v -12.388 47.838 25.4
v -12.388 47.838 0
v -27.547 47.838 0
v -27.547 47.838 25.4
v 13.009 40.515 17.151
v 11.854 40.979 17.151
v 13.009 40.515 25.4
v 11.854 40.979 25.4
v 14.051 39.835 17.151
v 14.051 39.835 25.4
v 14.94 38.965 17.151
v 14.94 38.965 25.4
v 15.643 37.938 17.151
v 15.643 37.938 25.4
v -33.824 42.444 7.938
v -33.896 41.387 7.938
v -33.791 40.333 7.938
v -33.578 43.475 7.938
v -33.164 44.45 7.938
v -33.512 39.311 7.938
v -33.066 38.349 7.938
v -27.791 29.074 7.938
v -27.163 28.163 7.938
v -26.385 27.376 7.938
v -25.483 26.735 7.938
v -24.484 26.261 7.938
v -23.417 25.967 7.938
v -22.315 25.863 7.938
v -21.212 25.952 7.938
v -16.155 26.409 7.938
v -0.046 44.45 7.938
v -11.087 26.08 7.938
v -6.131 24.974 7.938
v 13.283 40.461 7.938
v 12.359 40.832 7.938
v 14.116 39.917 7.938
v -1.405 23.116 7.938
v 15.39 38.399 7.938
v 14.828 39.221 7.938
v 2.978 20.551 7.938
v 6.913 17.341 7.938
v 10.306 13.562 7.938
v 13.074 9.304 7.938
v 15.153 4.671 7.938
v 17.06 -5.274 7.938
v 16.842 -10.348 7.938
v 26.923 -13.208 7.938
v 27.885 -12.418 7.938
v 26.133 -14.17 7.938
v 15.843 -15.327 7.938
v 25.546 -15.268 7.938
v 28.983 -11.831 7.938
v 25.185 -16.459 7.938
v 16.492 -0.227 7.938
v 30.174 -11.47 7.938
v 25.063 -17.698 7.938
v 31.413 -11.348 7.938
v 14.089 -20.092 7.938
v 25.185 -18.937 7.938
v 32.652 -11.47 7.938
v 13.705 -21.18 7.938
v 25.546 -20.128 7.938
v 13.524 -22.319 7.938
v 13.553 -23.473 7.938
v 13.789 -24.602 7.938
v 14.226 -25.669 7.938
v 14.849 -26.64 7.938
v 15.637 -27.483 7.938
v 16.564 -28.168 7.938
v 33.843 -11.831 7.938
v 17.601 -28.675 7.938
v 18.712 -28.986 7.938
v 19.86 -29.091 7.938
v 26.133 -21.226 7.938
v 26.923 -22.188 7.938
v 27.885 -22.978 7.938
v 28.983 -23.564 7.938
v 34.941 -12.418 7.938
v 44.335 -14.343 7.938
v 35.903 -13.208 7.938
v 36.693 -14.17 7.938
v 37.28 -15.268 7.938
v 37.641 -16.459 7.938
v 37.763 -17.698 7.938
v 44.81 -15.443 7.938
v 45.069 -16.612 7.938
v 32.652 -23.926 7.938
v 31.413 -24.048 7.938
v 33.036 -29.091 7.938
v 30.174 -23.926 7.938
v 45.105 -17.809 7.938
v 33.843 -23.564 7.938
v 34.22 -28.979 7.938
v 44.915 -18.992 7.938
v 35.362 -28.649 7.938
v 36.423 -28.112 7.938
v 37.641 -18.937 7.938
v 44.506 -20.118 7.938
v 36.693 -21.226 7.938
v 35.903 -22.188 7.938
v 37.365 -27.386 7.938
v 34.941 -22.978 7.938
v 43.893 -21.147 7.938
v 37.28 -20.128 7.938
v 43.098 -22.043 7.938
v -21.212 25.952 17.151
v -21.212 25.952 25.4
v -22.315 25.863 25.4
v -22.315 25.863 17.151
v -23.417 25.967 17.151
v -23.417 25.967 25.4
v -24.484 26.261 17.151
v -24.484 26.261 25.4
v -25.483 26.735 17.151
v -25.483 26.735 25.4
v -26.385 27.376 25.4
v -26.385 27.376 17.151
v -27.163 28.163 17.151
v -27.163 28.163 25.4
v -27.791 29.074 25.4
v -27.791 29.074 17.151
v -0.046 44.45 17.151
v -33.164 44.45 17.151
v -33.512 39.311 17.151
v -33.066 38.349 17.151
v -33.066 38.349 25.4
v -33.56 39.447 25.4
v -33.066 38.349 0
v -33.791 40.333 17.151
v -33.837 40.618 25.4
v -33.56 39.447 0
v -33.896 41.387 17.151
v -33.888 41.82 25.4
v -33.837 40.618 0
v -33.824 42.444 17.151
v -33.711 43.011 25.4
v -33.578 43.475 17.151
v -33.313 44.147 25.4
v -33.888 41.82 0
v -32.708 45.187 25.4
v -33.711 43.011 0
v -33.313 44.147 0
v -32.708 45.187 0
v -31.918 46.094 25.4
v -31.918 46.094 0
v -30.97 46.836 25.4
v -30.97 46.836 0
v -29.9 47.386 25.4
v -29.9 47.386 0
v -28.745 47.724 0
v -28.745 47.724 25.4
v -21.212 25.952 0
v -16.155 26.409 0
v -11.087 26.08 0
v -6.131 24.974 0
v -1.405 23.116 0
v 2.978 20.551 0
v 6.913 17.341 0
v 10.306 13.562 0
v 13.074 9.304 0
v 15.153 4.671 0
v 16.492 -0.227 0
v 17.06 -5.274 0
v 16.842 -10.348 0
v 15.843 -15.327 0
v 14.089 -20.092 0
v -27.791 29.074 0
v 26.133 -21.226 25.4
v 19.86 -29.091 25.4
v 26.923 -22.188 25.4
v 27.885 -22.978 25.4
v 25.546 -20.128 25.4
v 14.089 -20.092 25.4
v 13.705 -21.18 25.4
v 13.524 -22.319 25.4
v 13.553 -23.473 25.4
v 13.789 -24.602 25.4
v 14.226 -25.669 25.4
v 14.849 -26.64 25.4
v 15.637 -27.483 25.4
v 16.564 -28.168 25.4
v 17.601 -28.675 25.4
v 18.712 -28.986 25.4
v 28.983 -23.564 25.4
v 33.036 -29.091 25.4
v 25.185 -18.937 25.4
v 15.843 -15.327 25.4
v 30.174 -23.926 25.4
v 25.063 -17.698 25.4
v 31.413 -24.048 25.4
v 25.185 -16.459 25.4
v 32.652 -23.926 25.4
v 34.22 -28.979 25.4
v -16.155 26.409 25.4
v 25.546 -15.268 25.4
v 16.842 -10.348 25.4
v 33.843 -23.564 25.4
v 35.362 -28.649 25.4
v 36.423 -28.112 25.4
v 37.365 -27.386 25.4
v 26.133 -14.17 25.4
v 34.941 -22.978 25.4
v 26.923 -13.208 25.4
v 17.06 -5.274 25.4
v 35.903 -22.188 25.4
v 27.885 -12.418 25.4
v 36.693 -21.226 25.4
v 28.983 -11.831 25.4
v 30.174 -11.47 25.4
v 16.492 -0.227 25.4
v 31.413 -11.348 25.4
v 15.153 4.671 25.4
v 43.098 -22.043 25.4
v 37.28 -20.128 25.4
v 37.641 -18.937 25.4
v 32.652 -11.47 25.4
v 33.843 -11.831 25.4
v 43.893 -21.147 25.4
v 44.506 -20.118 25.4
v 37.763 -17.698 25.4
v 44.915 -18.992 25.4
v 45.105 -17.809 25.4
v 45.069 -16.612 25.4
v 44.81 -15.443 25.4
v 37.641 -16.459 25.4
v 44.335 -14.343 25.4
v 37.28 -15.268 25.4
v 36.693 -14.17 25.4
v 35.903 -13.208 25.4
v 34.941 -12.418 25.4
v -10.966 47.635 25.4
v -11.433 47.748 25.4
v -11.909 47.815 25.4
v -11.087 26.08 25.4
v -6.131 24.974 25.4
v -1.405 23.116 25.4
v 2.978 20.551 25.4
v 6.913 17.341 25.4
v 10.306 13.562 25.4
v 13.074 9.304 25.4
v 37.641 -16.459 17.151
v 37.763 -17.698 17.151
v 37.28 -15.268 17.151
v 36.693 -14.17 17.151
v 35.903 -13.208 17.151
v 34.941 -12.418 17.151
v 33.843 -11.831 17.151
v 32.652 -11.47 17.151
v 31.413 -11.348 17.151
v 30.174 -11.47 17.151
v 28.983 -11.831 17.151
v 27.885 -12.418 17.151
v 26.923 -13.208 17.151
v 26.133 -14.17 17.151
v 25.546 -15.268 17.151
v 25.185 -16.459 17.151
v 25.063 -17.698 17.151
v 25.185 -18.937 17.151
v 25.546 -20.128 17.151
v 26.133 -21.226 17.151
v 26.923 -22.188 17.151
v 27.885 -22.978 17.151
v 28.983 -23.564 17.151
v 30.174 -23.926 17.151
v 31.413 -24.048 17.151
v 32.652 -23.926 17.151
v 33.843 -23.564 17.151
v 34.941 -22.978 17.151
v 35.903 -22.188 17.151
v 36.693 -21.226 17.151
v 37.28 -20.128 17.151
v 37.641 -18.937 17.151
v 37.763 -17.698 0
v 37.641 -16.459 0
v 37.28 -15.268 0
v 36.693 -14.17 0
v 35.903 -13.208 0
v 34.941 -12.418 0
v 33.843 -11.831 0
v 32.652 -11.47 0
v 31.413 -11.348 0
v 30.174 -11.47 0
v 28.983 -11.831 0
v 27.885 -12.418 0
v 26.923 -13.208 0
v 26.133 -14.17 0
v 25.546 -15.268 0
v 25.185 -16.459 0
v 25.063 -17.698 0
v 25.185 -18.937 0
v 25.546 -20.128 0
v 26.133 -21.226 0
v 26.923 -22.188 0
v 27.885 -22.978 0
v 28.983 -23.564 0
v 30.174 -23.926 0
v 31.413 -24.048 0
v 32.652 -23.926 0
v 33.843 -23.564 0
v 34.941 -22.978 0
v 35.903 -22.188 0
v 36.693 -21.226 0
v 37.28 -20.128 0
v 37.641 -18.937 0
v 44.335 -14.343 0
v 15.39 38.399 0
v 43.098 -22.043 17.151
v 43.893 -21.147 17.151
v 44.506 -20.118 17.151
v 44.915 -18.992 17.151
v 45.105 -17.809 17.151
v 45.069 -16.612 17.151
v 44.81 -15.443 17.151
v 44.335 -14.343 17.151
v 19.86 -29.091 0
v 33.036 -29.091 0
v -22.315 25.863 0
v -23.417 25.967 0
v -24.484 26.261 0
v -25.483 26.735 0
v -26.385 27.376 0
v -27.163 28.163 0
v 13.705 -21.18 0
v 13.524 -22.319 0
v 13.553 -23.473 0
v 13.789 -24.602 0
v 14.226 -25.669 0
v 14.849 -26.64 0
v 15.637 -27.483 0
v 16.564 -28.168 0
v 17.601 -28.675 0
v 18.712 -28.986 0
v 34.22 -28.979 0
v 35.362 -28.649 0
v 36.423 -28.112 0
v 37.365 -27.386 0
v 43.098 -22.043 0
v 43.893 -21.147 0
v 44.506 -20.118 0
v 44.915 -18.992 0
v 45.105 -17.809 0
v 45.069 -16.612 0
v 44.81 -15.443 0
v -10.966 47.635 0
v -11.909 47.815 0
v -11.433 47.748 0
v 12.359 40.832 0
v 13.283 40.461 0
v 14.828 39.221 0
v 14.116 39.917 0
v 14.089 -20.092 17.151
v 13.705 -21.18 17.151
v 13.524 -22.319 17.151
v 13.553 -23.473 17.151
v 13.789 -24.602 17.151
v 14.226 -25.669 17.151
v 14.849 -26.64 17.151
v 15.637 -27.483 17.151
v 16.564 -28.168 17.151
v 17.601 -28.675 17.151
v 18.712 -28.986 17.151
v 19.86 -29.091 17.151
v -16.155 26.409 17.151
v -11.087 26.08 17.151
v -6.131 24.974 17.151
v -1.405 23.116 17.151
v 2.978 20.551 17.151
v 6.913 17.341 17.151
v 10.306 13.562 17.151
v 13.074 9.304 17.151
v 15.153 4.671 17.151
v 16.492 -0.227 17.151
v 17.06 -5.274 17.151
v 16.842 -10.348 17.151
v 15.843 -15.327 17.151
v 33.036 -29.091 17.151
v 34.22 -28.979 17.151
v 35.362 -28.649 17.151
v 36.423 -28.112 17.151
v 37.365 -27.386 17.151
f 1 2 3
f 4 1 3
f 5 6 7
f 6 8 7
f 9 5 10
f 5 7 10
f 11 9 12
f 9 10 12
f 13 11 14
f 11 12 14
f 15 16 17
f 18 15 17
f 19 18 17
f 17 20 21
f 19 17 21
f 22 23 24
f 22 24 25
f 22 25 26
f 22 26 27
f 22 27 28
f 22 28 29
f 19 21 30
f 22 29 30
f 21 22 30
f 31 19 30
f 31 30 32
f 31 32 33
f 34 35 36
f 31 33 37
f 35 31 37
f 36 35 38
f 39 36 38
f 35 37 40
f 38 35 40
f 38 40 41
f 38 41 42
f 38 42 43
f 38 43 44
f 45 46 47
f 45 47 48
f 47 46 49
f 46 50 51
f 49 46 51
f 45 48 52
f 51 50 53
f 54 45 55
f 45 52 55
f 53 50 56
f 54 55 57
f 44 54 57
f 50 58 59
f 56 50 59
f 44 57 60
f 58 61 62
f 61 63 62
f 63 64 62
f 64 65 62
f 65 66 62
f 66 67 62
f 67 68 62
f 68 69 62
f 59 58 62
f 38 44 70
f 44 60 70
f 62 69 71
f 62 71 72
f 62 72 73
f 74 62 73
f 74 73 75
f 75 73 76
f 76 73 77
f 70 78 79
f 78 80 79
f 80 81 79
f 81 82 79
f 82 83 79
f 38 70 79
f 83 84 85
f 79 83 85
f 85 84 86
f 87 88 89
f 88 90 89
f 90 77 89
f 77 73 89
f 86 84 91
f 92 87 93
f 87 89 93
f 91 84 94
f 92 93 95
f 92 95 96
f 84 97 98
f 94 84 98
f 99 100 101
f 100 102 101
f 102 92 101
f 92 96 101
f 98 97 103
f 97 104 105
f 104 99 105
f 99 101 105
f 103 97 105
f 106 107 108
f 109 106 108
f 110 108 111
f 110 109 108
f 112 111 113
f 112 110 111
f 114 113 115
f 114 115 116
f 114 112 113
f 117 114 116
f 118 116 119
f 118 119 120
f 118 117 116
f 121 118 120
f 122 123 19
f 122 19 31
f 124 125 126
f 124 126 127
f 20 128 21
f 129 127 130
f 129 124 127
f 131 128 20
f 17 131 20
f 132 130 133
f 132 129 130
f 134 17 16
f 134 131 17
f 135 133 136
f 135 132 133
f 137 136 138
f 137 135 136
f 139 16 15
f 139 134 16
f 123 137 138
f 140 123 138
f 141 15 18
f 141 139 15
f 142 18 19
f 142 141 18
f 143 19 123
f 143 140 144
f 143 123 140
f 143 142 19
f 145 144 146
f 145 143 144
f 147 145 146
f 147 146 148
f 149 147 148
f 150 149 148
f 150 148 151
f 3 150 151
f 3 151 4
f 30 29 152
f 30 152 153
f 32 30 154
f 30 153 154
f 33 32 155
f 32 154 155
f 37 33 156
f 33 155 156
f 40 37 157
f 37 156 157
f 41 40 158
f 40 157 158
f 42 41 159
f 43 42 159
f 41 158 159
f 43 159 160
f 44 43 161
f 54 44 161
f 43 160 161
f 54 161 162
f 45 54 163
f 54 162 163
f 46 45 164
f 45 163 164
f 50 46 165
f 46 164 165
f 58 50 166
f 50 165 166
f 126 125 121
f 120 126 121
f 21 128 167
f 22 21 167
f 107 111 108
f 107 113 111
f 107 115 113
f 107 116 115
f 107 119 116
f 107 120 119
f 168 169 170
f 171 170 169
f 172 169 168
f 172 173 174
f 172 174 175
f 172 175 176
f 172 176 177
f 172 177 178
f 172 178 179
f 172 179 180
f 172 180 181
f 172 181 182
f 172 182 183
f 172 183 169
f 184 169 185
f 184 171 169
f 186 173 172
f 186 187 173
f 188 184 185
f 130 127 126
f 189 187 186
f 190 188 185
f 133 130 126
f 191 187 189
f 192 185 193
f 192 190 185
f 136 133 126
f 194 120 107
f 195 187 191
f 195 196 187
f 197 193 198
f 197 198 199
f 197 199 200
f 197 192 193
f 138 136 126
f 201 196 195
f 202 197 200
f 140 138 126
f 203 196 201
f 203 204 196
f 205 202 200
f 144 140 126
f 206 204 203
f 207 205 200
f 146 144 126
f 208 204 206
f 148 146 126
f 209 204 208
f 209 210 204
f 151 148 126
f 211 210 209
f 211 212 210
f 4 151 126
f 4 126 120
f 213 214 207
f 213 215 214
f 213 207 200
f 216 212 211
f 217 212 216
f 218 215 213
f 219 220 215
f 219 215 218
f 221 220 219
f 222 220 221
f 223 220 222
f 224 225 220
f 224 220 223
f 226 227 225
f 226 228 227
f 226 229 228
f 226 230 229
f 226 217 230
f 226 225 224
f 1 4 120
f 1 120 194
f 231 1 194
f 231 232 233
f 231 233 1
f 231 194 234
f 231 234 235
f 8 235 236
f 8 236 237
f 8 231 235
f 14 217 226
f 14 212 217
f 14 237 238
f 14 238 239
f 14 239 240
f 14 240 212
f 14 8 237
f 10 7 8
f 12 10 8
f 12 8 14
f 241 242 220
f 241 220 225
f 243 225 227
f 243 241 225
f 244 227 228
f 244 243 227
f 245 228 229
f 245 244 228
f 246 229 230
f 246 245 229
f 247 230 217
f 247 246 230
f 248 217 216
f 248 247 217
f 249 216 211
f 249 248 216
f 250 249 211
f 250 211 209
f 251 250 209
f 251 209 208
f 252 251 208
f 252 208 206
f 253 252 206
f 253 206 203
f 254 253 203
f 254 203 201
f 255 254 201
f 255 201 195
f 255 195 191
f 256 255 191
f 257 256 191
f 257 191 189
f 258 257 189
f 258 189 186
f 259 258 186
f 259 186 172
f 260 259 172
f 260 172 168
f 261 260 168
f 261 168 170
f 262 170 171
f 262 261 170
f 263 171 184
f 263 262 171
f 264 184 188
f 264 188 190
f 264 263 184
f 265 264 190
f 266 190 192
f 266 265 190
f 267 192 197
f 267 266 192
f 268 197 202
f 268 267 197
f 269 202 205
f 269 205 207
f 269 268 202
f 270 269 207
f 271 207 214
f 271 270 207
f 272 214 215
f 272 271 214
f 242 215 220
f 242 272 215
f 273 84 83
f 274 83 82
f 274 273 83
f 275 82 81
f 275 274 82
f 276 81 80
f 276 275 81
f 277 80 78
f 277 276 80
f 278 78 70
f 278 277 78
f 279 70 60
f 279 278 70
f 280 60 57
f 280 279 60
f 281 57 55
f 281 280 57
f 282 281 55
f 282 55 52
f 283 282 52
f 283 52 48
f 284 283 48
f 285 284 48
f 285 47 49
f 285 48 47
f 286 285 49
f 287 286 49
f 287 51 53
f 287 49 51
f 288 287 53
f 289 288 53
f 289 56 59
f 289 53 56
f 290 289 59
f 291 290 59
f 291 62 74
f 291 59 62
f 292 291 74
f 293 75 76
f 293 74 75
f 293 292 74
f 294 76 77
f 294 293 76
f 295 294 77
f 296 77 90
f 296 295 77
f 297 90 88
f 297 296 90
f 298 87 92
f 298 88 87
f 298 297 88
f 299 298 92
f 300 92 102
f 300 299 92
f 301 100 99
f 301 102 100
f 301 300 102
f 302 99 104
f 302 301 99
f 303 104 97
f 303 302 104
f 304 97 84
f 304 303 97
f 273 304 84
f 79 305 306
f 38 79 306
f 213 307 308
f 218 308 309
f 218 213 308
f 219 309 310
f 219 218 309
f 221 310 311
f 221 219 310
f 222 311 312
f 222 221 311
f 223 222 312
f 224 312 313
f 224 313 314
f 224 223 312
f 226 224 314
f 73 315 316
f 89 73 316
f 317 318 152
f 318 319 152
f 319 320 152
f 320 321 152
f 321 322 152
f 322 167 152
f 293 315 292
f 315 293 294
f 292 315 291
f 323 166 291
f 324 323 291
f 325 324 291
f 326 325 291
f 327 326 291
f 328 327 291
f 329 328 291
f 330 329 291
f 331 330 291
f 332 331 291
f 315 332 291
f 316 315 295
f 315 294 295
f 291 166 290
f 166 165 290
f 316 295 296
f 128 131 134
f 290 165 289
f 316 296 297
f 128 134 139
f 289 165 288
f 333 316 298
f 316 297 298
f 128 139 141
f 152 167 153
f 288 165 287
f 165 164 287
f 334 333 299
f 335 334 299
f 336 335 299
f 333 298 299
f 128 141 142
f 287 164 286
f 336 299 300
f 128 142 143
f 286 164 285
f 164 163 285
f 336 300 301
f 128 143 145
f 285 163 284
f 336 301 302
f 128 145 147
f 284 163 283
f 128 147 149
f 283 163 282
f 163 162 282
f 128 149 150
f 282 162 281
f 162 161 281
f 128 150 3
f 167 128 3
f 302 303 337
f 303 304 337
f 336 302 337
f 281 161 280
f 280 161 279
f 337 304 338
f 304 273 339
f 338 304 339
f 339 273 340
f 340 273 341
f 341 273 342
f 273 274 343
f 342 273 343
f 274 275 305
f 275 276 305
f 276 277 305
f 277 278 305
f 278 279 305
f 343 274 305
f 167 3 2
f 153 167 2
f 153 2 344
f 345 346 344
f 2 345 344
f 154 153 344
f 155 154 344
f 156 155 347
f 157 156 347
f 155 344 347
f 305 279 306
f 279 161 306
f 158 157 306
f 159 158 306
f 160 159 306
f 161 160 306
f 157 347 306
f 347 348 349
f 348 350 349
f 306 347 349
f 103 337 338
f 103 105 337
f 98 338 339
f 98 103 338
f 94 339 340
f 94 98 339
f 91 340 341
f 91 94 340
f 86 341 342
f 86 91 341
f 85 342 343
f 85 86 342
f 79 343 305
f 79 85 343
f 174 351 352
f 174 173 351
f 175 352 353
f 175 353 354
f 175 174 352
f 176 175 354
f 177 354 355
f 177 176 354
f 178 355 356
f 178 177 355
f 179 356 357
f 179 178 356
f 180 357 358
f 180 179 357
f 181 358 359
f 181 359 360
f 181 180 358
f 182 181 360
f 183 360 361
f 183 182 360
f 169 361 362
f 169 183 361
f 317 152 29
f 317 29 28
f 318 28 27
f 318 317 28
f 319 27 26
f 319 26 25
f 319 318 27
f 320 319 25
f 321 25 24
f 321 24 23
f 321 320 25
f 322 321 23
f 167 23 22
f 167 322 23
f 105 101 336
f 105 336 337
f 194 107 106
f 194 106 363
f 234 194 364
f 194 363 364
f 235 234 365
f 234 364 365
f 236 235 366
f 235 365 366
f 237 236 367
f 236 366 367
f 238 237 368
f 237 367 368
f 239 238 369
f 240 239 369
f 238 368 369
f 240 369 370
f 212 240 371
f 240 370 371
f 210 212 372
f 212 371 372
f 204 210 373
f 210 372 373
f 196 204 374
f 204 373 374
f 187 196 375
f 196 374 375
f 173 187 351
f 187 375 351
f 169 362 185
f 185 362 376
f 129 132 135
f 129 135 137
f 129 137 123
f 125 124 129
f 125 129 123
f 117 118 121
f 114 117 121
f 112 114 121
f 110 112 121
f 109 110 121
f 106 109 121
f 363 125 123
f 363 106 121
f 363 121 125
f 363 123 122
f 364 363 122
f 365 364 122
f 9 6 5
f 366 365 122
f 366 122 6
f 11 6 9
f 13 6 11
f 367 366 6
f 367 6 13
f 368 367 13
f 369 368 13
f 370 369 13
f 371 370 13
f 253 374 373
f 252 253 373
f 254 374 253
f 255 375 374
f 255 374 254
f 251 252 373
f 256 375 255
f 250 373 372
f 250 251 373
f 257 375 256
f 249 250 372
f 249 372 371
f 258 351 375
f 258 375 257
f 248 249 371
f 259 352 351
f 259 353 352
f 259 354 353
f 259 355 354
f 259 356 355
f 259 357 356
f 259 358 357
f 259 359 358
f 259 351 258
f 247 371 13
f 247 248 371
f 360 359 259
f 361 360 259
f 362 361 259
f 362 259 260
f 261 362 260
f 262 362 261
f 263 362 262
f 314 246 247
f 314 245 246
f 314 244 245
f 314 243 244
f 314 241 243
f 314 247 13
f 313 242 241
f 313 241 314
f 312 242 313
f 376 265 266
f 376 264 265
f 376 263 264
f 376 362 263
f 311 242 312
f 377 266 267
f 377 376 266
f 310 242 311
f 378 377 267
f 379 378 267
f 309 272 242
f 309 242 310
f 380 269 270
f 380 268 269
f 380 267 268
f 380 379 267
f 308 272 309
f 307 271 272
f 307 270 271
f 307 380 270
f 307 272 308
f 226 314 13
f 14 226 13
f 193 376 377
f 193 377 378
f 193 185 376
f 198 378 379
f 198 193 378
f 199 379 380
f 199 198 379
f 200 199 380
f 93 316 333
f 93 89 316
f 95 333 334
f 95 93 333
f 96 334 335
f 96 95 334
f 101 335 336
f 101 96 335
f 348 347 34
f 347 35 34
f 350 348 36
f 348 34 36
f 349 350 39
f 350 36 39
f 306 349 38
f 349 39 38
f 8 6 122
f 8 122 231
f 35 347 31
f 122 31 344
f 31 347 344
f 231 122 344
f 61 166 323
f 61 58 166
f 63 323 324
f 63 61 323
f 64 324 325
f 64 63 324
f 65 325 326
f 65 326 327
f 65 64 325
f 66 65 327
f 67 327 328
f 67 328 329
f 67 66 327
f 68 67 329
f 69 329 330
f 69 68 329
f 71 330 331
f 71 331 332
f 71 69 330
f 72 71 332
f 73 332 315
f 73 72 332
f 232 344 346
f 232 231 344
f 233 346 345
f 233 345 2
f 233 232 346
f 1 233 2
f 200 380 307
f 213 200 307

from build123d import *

# Parameters (mm, degrees)
F0_R        = 6.35
F1_DEPTH    = 25.4
F2_W        = 123.3146692741
F2_H        = 9.2131719061
F3_DEPTH    = 44.45
F4_R        = 6.35
F5_R        = 5.08
F6_R        = 5.08
F7_R        = 6.35
F8_R        = 6.35
F9_T1_DEPTH = 31.6918409034
F9_T3_DEPTH = 32.0036689973
F9_T5_DEPTH = 79.9823917725


# Not quite as in the source:
# - a fillet or chamfer that OpenCascade refuses, or shapes differently, is made with other operations: its cross-section is extruded or revolved along the edge and cut away or added


with BuildPart() as f1:
    # F0 (on Top) → F1 (new body)
    with BuildSketch(Plane.XY):
        with BuildLine():
            Line((-38.4631145681, 47.8382077998), (-25.4427038645, 24.9439910361))
            ThreePointArc((-25.4427038645, 24.9439910361), (12.1724359017, 10.8562296523), (7.9763394945, -29.0906918233))
            Line((7.9763394945, -29.0906918233), (35.5361980368, -29.0906918233))
            Line((35.5361980368, -29.0906918233), (46.7120397772, -18.6743740407))
            Line((46.7120397772, -18.6743740407), (14.3780414237, 40.2429682227))
            Line((14.3780414237, 40.2429682227), (-11.6627799835, 47.8382077998))
            Line((-11.6627799835, 47.8382077998), (-38.4631145681, 47.8382077998))
        make_face()
        with Locations((31.4130679807, -17.697843238)):
            Circle(F0_R, mode=Mode.SUBTRACT)
    extrude(amount=F1_DEPTH)

    # F2 (on Front) → F3 (cut, symmetric)
    with BuildSketch(Plane.XZ):
        with Locations((5.399286747, 12.5440859531)):
            Rectangle(F2_W, F2_H)
    extrude(amount=F3_DEPTH, both=True, mode=Mode.SUBTRACT)

    # F4
    f4_edges = [f1.edges().sort_by_distance(p)[0] for p in [
        (14.378041, 40.242968, 21.275336),
    ]]
    fillet(f4_edges, radius=F4_R)

    # F5
    f5_edges = [f1.edges().sort_by_distance(p)[0] for p in [
        (14.378041, 40.242968, 3.96875),
    ]]
    fillet(f5_edges, radius=F5_R)

    # F6
    f6_edges = [f1.edges().sort_by_distance(p)[0] for p in [
        (-11.66278, 47.838208, 12.7),
    ]]
    fillet(f6_edges, radius=F6_R)

    # F7
    f7_edges = [f1.edges().sort_by_distance(p)[0] for p in [
        (7.976339, -29.090692, 21.275336),
        (7.976339, -29.090692, 3.96875),
    ]]
    fillet(f7_edges, radius=F7_R)

    # F8
    f8_edges = [f1.edges().sort_by_distance(p)[0] for p in [
        (35.536198, -29.090692, 3.96875),
        (35.536198, -29.090692, 21.275336),
        (46.71204, -18.674374, 21.275336),
        (46.71204, -18.674374, 3.96875),
    ]]
    fillet(f8_edges, radius=F8_R)

    # F9: fillet of radius 6.35 on 3 edges, made by hand

    # F9_s2 → F9_t1 (cut)
    with BuildSketch(Plane.XY.offset(-11.8771704517)):
        with BuildLine():
            ThreePointArc((-21.2123797216, 25.95187937), (-24.9938313602, 26.4760275688), (-27.791358986, 29.0737086524))
            Line((-27.791358986, 29.0737086524), (-25.4427038645, 24.9439910361))
            ThreePointArc((-25.4427038645, 24.9439910361), (-23.3442549108, 25.5180837534), (-21.2123797216, 25.95187937))
        make_face()
    extrude(amount=F9_T1_DEPTH, mode=Mode.SUBTRACT)

    # F9_s4 → F9_t3 (cut)
    with BuildSketch(Plane.XY.offset(5.2735014544)):
        with BuildLine():
            ThreePointArc((-27.791358986, 29.0737086524), (-24.9938313602, 26.4760275688), (-21.2123797216, 25.95187937))
            ThreePointArc((-21.2123797216, 25.95187937), (-23.3442549108, 25.5180837534), (-25.4427038645, 24.9439910361))
            Line((-25.4427038645, 24.9439910361), (-27.791358986, 29.0737086524))
        make_face()
    extrude(amount=F9_T3_DEPTH, mode=Mode.SUBTRACT)

    # F9_s6 → F9_t5 (cut)
    with BuildSketch(Plane.XY.offset(-27.2911958862)):
        with BuildLine():
            ThreePointArc((-33.0664077304, 38.3490005109), (-33.0355553369, 44.6810539999), (-27.5466362136, 47.8382077998))
            Line((-27.5466362136, 47.8382077998), (-38.4631145681, 47.8382077998))
            Line((-38.4631145681, 47.8382077998), (-33.0664077304, 38.3490005109))
        make_face()
    extrude(amount=F9_T5_DEPTH, mode=Mode.SUBTRACT)


solid = f1.part
